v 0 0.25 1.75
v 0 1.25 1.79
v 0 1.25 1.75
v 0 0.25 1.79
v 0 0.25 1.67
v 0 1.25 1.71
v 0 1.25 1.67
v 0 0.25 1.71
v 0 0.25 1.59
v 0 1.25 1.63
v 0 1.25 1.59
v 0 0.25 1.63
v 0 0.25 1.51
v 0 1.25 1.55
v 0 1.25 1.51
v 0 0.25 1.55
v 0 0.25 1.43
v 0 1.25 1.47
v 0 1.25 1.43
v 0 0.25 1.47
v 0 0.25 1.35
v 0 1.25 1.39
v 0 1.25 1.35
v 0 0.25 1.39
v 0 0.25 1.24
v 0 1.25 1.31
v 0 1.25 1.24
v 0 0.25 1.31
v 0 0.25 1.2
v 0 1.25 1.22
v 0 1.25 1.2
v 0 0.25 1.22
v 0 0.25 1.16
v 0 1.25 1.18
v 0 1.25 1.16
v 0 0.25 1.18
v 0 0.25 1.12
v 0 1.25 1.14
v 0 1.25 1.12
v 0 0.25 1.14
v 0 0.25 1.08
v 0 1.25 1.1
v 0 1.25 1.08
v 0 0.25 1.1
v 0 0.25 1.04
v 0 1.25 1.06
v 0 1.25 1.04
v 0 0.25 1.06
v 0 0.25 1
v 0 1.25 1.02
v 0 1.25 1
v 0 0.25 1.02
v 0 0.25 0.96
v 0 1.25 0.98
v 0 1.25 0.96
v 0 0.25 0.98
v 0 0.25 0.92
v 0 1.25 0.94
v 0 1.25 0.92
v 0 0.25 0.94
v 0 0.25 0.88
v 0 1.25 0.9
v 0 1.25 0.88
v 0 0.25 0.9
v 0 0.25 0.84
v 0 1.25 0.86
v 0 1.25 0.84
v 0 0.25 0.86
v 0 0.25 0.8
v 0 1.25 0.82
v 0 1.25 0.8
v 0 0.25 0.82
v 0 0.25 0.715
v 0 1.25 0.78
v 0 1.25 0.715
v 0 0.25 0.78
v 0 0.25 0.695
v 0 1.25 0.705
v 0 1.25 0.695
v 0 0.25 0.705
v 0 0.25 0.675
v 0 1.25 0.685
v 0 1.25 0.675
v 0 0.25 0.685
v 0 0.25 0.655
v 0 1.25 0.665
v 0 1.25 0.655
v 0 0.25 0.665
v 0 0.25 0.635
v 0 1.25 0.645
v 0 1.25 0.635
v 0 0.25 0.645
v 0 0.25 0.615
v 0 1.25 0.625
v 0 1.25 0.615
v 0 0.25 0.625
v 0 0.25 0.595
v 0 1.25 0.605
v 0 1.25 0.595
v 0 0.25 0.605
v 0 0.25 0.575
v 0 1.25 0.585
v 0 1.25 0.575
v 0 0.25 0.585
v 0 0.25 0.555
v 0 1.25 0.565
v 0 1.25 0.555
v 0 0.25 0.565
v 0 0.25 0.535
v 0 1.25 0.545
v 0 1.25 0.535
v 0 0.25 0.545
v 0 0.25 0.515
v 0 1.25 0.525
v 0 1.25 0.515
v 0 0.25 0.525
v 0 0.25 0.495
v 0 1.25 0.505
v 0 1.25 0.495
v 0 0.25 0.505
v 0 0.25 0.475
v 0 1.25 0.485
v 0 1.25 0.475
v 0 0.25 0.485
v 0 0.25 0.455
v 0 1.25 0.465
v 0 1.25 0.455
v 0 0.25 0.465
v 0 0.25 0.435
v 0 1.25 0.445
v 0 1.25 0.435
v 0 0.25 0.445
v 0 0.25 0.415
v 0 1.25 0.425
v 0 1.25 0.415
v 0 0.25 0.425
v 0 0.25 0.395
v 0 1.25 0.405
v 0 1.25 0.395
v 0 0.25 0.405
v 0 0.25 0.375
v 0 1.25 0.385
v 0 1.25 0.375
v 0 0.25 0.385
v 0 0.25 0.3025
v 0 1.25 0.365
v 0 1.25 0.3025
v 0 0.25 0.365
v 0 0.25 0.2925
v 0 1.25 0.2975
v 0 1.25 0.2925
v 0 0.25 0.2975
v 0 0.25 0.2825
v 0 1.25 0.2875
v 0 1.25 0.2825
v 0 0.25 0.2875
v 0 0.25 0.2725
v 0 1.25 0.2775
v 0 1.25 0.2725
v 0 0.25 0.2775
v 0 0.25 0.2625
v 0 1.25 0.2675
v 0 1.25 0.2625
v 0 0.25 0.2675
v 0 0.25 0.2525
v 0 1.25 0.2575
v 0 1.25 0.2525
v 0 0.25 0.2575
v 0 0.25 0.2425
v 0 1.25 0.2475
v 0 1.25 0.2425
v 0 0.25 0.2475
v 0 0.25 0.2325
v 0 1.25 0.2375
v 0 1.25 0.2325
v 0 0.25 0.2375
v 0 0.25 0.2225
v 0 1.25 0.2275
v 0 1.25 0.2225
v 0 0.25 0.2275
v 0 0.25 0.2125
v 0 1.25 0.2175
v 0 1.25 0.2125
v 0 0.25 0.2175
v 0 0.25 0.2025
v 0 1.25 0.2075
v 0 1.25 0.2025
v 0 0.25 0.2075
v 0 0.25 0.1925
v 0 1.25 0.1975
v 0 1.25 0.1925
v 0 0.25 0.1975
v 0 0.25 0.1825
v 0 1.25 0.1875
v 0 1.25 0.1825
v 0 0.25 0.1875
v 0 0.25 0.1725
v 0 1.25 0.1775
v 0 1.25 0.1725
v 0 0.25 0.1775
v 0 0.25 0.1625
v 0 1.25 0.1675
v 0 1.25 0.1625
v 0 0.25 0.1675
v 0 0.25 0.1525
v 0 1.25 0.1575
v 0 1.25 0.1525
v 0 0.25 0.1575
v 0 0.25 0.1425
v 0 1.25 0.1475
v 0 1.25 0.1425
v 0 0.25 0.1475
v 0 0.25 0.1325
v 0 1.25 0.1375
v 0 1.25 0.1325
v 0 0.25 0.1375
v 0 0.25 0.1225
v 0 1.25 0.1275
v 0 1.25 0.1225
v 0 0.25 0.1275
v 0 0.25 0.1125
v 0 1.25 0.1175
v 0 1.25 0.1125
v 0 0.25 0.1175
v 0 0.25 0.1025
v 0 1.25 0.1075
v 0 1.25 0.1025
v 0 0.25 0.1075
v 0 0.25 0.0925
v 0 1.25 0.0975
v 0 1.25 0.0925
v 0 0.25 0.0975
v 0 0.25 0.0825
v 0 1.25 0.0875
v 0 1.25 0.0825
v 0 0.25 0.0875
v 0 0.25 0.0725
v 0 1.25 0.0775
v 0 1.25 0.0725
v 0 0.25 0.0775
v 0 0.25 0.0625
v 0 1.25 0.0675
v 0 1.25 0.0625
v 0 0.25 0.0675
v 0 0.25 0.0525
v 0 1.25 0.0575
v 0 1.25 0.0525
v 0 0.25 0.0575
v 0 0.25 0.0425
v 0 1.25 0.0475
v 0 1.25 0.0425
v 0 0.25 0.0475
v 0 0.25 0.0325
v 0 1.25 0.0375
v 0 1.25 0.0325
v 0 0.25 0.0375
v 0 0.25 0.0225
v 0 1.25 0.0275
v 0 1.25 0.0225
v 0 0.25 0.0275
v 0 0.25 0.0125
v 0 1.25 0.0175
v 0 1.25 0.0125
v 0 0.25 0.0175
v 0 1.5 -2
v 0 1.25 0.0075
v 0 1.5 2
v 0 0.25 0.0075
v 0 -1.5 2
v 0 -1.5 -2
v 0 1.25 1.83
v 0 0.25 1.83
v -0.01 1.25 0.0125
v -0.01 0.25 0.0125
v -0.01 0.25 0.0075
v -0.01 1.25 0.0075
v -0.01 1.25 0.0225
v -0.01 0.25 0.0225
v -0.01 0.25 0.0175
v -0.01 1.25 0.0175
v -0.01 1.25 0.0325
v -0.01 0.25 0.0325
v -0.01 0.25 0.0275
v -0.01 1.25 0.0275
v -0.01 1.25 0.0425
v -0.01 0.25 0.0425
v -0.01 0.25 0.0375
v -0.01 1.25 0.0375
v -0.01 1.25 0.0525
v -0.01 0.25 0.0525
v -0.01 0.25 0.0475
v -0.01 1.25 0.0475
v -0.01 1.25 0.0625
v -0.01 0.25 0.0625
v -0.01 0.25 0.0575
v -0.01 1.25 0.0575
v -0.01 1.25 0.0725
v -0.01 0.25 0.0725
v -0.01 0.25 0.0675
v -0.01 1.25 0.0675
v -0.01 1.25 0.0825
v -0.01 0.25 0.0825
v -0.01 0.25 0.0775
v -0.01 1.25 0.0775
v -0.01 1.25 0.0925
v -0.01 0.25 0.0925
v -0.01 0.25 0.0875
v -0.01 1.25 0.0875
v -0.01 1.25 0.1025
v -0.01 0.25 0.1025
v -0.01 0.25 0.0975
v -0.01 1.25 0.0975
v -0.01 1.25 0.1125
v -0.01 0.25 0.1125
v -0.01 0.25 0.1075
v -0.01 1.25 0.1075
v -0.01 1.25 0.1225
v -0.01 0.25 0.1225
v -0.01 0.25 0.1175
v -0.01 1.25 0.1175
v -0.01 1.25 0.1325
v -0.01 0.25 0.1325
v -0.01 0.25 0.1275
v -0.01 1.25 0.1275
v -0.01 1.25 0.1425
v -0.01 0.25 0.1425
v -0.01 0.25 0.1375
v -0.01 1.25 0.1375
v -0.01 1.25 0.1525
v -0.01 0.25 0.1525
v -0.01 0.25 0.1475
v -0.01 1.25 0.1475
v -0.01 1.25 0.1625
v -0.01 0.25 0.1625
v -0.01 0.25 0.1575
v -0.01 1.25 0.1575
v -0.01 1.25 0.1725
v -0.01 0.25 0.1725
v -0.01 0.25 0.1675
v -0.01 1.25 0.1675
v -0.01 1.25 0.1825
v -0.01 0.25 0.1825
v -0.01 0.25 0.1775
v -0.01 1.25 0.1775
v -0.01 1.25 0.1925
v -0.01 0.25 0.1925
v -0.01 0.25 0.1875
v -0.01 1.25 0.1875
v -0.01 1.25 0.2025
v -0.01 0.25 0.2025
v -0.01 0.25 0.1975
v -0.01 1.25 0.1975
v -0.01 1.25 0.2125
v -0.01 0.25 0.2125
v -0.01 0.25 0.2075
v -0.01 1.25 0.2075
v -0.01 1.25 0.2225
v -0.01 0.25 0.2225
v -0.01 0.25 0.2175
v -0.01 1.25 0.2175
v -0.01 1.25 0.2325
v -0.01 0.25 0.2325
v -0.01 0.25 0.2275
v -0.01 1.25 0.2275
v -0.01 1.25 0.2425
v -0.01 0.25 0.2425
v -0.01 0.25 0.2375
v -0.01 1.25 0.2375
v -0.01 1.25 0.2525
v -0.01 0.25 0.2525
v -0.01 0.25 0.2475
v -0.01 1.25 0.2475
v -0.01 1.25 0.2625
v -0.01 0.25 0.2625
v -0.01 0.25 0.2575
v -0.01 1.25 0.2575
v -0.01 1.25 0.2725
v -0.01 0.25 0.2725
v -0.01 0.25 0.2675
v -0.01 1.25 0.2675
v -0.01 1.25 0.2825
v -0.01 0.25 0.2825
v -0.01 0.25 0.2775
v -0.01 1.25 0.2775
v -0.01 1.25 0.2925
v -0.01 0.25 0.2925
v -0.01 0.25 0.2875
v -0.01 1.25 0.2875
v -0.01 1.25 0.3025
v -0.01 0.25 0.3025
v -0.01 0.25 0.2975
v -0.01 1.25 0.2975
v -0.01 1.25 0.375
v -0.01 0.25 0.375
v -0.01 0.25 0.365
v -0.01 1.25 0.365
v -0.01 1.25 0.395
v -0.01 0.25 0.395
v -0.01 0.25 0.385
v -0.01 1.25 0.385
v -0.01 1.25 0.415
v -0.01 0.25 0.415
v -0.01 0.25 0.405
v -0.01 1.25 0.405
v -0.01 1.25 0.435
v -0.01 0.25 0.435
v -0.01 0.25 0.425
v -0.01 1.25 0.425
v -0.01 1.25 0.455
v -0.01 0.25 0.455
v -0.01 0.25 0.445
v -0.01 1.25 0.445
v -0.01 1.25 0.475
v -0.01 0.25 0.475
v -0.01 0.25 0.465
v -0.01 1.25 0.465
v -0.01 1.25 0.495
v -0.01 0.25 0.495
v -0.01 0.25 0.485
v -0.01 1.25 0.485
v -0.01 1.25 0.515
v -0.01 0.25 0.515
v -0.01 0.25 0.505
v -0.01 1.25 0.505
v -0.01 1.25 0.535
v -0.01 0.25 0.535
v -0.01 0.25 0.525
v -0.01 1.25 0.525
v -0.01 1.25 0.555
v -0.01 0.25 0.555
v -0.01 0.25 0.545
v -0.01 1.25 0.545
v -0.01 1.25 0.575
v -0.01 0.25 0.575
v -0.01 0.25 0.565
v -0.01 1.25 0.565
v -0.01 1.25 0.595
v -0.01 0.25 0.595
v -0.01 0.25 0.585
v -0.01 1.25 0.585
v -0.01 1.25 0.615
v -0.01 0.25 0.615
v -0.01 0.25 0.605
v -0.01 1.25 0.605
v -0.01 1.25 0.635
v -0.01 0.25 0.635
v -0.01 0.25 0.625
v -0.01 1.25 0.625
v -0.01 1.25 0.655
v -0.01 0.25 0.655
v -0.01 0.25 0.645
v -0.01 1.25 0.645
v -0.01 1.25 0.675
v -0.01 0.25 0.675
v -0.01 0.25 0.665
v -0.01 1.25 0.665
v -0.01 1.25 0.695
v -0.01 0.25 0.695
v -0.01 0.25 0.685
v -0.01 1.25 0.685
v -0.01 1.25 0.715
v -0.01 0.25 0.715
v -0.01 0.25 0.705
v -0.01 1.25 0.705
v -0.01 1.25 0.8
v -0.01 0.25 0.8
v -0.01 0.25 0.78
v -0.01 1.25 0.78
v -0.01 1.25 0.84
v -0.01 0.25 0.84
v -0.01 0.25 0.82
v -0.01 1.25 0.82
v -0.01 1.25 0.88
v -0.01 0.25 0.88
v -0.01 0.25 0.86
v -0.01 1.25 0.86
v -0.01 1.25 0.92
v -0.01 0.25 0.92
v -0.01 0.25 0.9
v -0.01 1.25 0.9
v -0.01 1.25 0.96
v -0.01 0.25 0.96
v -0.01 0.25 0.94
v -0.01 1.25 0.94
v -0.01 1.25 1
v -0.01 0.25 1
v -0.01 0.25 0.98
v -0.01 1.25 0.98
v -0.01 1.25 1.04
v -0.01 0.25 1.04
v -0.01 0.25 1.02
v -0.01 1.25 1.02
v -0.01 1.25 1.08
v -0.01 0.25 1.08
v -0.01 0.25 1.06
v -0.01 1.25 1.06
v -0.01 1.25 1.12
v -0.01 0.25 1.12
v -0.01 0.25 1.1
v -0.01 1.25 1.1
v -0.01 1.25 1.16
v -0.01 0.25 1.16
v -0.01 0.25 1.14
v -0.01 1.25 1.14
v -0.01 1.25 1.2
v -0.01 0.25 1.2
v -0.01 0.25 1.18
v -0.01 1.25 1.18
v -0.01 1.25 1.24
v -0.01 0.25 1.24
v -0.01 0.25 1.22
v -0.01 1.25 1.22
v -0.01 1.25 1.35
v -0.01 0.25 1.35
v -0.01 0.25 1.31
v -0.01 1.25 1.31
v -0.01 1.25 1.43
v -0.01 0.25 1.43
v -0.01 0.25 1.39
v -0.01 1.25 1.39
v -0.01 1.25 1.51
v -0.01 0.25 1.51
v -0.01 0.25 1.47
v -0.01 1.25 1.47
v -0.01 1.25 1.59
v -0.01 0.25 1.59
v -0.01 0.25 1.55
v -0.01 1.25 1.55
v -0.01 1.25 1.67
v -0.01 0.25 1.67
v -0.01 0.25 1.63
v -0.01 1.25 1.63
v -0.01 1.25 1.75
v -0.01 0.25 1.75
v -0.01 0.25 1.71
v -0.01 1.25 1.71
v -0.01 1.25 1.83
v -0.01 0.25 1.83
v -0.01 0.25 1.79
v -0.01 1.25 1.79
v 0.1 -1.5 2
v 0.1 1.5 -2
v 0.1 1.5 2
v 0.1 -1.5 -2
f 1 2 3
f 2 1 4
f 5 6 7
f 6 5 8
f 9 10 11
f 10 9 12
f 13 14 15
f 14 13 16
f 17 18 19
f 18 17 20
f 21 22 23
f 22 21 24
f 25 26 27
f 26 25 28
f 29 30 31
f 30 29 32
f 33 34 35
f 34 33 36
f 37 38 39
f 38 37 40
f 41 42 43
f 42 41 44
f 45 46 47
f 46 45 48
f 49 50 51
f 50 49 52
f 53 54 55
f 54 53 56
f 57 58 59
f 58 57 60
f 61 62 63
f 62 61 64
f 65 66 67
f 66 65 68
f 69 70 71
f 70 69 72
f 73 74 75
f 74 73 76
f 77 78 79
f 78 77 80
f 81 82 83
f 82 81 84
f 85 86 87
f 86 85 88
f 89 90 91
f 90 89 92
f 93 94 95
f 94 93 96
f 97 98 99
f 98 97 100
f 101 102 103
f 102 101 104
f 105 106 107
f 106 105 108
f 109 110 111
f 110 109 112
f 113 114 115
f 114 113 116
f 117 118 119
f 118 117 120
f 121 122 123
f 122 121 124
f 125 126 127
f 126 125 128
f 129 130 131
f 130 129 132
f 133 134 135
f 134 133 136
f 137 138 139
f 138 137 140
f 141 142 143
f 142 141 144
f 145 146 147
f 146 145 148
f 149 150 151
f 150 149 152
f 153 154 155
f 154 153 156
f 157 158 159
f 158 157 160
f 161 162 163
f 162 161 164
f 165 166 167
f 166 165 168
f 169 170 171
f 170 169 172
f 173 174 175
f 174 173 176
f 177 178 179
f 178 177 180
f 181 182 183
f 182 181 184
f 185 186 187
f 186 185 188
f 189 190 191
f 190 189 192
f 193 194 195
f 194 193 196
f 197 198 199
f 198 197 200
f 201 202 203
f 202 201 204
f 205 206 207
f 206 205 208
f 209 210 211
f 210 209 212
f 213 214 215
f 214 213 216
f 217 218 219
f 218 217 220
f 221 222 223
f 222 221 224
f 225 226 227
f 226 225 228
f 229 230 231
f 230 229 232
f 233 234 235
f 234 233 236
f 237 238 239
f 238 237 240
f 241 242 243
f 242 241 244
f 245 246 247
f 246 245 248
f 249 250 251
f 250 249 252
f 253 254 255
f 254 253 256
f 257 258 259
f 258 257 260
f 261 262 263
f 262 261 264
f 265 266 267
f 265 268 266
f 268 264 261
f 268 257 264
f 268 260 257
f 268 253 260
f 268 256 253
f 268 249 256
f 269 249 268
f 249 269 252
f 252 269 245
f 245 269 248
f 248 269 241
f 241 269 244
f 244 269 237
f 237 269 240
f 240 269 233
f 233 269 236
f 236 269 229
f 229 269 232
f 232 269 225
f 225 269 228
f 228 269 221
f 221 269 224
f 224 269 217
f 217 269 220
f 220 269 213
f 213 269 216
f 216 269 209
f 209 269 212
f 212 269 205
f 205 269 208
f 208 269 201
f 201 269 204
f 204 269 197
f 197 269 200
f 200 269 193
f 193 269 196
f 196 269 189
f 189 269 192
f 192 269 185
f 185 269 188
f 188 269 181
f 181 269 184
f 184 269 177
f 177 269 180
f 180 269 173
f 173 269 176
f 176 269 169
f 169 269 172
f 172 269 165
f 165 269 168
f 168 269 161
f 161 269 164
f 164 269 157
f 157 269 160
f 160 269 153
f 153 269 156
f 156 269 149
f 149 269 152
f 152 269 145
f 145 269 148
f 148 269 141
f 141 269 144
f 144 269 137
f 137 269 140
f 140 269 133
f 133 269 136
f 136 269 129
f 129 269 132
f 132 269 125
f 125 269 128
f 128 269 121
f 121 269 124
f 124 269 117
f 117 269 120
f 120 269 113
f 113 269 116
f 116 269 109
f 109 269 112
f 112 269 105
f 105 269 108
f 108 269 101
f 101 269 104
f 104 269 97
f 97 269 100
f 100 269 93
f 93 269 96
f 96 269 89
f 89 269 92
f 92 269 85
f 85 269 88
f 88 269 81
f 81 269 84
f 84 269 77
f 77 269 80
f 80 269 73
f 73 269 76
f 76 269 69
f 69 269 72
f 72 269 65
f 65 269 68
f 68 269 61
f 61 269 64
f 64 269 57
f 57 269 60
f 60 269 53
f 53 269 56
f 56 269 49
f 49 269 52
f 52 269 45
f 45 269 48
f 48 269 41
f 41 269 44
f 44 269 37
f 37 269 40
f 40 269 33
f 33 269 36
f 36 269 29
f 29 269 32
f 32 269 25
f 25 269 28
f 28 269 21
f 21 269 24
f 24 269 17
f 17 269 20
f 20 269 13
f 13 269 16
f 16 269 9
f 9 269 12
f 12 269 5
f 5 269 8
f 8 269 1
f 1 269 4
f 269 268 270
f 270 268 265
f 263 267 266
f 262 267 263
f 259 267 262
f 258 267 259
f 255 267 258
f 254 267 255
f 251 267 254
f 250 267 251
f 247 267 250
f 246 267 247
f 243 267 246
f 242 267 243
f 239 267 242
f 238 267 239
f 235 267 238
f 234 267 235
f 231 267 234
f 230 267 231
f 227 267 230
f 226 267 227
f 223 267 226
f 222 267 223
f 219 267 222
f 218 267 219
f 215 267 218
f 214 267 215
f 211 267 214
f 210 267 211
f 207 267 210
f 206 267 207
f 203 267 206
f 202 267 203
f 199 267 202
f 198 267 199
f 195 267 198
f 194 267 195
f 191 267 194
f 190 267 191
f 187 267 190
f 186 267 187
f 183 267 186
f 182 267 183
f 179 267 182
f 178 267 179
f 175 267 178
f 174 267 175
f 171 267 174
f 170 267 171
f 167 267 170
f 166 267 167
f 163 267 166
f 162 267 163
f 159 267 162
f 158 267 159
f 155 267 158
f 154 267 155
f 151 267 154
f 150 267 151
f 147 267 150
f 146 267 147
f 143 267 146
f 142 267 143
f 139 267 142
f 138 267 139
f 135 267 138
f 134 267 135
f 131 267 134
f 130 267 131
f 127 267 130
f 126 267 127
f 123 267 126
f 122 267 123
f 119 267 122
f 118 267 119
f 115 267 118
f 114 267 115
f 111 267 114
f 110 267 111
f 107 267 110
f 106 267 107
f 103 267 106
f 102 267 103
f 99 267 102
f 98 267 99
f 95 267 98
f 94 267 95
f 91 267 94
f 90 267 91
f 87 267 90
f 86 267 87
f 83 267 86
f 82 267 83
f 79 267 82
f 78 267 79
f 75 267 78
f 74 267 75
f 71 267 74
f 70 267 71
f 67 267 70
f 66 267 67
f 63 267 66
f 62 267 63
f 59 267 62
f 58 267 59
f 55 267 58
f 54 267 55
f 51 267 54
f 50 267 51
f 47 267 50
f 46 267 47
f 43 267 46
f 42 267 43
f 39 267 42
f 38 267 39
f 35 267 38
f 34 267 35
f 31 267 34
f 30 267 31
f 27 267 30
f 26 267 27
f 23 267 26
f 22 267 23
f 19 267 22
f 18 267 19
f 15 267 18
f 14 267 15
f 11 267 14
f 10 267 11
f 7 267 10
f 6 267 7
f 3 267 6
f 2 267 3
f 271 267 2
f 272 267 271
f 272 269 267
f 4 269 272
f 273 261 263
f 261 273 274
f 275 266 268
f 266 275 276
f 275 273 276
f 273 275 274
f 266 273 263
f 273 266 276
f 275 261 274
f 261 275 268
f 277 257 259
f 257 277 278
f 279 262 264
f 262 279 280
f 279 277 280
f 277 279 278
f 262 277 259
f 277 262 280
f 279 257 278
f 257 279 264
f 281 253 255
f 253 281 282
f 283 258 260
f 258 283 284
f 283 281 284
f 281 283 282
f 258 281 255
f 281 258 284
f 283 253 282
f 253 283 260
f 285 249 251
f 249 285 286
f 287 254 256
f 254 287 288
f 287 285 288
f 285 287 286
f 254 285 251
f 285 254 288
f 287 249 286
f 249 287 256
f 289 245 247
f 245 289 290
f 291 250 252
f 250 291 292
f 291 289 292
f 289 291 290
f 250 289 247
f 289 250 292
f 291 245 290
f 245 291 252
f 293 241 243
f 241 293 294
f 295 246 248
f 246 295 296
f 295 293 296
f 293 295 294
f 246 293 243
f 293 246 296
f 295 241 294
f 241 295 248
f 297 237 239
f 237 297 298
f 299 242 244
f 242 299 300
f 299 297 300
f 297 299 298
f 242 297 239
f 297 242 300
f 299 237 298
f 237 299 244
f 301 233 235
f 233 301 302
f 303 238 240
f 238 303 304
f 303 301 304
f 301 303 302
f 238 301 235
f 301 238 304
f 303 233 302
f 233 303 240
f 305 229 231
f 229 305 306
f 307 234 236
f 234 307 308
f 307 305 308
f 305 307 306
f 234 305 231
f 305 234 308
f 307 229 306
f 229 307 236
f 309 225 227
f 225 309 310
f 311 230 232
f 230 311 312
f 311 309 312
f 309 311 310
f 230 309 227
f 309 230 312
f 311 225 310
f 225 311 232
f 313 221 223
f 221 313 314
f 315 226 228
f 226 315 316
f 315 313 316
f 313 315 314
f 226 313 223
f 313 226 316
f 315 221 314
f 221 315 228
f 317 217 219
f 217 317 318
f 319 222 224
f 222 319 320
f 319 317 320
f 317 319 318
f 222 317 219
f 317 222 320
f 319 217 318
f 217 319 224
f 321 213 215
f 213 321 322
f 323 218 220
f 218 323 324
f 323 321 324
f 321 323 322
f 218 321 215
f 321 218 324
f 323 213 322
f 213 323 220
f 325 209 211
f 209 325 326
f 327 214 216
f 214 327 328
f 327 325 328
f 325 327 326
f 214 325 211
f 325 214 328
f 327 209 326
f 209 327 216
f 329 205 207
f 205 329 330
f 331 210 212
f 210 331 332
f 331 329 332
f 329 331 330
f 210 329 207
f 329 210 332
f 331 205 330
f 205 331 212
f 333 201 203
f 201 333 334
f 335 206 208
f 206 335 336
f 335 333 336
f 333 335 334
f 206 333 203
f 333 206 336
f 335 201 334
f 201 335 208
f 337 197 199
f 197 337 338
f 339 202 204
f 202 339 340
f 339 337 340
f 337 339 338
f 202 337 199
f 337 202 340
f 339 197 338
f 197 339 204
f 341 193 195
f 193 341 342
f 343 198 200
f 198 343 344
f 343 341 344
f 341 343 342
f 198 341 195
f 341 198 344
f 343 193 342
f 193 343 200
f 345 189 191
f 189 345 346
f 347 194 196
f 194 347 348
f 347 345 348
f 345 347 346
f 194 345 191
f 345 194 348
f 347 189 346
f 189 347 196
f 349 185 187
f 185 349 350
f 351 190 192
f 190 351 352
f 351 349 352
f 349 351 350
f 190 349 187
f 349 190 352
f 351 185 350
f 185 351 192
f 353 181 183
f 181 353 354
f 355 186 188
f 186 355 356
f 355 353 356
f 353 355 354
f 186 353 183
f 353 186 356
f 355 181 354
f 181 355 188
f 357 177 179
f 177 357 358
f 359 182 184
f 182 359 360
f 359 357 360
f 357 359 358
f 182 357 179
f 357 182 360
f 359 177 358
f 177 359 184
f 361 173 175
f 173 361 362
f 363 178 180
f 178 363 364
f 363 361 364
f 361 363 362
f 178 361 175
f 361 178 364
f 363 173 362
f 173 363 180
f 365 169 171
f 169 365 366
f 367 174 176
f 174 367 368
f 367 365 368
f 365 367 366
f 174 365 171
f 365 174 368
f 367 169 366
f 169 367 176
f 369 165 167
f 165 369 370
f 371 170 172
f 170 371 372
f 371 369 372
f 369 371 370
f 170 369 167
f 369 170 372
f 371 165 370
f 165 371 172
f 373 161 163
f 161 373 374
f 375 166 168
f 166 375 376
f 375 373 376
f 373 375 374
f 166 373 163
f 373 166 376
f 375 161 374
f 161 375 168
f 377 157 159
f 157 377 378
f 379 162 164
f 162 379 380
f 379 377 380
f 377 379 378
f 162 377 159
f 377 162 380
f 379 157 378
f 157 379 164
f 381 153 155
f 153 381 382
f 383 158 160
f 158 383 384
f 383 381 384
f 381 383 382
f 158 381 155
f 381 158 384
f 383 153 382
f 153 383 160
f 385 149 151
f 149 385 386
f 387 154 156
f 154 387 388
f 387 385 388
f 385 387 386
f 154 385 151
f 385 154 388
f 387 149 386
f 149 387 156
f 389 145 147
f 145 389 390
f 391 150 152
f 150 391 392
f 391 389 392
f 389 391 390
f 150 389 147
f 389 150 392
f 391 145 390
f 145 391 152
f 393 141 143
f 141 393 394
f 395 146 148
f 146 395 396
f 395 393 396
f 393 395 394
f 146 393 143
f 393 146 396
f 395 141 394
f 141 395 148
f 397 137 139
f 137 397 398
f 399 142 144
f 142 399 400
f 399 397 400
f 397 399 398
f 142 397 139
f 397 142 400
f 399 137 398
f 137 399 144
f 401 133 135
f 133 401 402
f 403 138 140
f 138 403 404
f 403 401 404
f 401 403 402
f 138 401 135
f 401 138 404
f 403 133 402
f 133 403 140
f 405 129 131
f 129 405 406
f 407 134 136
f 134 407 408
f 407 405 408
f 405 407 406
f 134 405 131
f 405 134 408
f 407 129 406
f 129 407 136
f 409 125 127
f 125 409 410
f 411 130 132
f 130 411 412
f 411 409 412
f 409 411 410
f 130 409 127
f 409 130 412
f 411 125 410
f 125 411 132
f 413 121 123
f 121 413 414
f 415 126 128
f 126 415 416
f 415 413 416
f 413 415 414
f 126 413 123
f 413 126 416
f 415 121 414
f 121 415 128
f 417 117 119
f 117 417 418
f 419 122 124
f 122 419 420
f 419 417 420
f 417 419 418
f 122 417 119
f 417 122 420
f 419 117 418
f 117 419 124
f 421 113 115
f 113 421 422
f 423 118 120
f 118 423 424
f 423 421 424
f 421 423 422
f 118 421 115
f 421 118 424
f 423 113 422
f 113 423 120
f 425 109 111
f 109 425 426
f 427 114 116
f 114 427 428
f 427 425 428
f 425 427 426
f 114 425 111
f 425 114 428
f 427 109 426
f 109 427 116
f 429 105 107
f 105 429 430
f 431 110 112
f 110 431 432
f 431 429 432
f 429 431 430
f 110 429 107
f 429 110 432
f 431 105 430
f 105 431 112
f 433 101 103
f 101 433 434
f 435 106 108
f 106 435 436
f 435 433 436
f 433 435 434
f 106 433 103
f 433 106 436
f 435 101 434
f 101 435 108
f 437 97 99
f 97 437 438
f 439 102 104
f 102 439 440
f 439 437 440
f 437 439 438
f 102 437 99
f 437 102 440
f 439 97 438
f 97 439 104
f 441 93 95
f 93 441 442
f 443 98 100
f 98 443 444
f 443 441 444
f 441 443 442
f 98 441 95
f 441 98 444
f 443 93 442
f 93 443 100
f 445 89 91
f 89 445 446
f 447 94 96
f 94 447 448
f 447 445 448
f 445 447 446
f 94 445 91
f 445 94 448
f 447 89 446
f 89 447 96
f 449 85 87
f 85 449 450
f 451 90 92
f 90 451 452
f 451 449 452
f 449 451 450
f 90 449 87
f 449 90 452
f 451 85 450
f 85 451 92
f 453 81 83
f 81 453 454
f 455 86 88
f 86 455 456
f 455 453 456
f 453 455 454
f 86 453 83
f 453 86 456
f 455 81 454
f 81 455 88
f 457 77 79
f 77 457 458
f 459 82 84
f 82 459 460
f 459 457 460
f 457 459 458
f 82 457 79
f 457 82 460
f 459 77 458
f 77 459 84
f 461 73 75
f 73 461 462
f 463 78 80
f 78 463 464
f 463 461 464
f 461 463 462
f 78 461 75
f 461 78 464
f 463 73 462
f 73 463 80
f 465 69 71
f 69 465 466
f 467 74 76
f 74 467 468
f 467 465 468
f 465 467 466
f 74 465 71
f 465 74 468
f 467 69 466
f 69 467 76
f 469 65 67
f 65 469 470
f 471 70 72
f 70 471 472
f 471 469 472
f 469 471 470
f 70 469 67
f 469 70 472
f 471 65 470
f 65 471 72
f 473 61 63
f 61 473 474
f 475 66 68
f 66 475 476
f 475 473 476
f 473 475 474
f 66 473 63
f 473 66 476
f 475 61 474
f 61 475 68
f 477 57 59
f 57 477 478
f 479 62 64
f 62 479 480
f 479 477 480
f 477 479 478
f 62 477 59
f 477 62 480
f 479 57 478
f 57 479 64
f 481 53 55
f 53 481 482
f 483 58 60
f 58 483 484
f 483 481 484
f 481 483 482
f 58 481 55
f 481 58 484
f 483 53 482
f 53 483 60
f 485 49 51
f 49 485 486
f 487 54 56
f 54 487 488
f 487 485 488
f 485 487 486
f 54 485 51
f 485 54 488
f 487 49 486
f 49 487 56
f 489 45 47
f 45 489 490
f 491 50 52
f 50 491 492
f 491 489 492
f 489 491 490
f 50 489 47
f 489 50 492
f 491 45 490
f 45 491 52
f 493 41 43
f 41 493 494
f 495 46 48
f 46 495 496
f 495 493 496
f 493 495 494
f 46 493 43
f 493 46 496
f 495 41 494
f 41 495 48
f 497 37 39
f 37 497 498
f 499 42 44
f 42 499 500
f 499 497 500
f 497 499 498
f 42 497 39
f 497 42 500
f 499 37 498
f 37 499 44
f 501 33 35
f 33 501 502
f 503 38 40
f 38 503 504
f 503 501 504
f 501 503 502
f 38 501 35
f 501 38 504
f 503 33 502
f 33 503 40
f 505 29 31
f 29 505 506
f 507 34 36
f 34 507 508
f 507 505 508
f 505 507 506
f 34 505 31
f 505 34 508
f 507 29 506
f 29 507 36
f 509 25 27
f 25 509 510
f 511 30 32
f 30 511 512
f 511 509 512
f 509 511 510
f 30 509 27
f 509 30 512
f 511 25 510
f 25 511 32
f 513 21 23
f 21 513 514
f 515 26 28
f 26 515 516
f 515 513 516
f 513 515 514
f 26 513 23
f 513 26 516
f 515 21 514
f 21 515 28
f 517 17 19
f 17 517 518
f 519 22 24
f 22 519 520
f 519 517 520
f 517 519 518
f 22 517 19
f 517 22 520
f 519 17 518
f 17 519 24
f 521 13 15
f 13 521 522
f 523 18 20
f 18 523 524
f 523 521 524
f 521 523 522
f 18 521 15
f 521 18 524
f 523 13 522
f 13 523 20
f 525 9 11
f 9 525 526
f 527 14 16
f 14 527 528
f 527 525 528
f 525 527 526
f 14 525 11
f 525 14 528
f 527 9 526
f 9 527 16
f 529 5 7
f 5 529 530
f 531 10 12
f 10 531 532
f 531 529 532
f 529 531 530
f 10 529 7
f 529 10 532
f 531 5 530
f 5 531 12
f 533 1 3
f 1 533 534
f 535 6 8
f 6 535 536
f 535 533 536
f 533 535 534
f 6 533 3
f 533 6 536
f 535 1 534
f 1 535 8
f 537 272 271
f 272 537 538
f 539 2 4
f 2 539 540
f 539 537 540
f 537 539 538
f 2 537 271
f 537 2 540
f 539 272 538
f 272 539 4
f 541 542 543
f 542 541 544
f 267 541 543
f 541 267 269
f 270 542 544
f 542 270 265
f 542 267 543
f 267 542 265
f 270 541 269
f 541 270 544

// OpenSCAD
dl=0.1;  //cm
dc=0.01; //cm
translate([dl/2,0,0]) color("gray",alpha=0.3)
    cube([dl,3,4],true);
dz1=0.01; //cm
for(i=[1:30])
    // 100 p.l./cm == 1 p.l./0.01cm
    translate([-dc/2,0.75,i*dz1]) color("DimGray",1.0)
        cube([dc,1,dz1/2],true);

dz2=0.02; //cm
for(i=[1:18])
    // 50 p.l./cm == 1 p.l./0.02cm
    translate([-dc/2,0.75,0.35+i*dz2]) color("DimGray",1.0)
        cube([dc,1,dz2/2],true);

dz3=0.04; //cm
for(i=[1:12])
    // 25 p.l./cm == 1 p.l./0.04cm
    translate([-dc/2,0.75,0.75+i*dz3]) color("DimGray",1.0)
        cube([dc,1,dz3/2],true);

dz4=0.08; //cm
for(i=[1:7])
    // 12.5 p.l./cm == 1 p.l./0.08cm
    translate([-dc/2,0.75,1.25+i*dz4]) color("DimGray",1.0)
        cube([dc,1,dz4/2],true);
